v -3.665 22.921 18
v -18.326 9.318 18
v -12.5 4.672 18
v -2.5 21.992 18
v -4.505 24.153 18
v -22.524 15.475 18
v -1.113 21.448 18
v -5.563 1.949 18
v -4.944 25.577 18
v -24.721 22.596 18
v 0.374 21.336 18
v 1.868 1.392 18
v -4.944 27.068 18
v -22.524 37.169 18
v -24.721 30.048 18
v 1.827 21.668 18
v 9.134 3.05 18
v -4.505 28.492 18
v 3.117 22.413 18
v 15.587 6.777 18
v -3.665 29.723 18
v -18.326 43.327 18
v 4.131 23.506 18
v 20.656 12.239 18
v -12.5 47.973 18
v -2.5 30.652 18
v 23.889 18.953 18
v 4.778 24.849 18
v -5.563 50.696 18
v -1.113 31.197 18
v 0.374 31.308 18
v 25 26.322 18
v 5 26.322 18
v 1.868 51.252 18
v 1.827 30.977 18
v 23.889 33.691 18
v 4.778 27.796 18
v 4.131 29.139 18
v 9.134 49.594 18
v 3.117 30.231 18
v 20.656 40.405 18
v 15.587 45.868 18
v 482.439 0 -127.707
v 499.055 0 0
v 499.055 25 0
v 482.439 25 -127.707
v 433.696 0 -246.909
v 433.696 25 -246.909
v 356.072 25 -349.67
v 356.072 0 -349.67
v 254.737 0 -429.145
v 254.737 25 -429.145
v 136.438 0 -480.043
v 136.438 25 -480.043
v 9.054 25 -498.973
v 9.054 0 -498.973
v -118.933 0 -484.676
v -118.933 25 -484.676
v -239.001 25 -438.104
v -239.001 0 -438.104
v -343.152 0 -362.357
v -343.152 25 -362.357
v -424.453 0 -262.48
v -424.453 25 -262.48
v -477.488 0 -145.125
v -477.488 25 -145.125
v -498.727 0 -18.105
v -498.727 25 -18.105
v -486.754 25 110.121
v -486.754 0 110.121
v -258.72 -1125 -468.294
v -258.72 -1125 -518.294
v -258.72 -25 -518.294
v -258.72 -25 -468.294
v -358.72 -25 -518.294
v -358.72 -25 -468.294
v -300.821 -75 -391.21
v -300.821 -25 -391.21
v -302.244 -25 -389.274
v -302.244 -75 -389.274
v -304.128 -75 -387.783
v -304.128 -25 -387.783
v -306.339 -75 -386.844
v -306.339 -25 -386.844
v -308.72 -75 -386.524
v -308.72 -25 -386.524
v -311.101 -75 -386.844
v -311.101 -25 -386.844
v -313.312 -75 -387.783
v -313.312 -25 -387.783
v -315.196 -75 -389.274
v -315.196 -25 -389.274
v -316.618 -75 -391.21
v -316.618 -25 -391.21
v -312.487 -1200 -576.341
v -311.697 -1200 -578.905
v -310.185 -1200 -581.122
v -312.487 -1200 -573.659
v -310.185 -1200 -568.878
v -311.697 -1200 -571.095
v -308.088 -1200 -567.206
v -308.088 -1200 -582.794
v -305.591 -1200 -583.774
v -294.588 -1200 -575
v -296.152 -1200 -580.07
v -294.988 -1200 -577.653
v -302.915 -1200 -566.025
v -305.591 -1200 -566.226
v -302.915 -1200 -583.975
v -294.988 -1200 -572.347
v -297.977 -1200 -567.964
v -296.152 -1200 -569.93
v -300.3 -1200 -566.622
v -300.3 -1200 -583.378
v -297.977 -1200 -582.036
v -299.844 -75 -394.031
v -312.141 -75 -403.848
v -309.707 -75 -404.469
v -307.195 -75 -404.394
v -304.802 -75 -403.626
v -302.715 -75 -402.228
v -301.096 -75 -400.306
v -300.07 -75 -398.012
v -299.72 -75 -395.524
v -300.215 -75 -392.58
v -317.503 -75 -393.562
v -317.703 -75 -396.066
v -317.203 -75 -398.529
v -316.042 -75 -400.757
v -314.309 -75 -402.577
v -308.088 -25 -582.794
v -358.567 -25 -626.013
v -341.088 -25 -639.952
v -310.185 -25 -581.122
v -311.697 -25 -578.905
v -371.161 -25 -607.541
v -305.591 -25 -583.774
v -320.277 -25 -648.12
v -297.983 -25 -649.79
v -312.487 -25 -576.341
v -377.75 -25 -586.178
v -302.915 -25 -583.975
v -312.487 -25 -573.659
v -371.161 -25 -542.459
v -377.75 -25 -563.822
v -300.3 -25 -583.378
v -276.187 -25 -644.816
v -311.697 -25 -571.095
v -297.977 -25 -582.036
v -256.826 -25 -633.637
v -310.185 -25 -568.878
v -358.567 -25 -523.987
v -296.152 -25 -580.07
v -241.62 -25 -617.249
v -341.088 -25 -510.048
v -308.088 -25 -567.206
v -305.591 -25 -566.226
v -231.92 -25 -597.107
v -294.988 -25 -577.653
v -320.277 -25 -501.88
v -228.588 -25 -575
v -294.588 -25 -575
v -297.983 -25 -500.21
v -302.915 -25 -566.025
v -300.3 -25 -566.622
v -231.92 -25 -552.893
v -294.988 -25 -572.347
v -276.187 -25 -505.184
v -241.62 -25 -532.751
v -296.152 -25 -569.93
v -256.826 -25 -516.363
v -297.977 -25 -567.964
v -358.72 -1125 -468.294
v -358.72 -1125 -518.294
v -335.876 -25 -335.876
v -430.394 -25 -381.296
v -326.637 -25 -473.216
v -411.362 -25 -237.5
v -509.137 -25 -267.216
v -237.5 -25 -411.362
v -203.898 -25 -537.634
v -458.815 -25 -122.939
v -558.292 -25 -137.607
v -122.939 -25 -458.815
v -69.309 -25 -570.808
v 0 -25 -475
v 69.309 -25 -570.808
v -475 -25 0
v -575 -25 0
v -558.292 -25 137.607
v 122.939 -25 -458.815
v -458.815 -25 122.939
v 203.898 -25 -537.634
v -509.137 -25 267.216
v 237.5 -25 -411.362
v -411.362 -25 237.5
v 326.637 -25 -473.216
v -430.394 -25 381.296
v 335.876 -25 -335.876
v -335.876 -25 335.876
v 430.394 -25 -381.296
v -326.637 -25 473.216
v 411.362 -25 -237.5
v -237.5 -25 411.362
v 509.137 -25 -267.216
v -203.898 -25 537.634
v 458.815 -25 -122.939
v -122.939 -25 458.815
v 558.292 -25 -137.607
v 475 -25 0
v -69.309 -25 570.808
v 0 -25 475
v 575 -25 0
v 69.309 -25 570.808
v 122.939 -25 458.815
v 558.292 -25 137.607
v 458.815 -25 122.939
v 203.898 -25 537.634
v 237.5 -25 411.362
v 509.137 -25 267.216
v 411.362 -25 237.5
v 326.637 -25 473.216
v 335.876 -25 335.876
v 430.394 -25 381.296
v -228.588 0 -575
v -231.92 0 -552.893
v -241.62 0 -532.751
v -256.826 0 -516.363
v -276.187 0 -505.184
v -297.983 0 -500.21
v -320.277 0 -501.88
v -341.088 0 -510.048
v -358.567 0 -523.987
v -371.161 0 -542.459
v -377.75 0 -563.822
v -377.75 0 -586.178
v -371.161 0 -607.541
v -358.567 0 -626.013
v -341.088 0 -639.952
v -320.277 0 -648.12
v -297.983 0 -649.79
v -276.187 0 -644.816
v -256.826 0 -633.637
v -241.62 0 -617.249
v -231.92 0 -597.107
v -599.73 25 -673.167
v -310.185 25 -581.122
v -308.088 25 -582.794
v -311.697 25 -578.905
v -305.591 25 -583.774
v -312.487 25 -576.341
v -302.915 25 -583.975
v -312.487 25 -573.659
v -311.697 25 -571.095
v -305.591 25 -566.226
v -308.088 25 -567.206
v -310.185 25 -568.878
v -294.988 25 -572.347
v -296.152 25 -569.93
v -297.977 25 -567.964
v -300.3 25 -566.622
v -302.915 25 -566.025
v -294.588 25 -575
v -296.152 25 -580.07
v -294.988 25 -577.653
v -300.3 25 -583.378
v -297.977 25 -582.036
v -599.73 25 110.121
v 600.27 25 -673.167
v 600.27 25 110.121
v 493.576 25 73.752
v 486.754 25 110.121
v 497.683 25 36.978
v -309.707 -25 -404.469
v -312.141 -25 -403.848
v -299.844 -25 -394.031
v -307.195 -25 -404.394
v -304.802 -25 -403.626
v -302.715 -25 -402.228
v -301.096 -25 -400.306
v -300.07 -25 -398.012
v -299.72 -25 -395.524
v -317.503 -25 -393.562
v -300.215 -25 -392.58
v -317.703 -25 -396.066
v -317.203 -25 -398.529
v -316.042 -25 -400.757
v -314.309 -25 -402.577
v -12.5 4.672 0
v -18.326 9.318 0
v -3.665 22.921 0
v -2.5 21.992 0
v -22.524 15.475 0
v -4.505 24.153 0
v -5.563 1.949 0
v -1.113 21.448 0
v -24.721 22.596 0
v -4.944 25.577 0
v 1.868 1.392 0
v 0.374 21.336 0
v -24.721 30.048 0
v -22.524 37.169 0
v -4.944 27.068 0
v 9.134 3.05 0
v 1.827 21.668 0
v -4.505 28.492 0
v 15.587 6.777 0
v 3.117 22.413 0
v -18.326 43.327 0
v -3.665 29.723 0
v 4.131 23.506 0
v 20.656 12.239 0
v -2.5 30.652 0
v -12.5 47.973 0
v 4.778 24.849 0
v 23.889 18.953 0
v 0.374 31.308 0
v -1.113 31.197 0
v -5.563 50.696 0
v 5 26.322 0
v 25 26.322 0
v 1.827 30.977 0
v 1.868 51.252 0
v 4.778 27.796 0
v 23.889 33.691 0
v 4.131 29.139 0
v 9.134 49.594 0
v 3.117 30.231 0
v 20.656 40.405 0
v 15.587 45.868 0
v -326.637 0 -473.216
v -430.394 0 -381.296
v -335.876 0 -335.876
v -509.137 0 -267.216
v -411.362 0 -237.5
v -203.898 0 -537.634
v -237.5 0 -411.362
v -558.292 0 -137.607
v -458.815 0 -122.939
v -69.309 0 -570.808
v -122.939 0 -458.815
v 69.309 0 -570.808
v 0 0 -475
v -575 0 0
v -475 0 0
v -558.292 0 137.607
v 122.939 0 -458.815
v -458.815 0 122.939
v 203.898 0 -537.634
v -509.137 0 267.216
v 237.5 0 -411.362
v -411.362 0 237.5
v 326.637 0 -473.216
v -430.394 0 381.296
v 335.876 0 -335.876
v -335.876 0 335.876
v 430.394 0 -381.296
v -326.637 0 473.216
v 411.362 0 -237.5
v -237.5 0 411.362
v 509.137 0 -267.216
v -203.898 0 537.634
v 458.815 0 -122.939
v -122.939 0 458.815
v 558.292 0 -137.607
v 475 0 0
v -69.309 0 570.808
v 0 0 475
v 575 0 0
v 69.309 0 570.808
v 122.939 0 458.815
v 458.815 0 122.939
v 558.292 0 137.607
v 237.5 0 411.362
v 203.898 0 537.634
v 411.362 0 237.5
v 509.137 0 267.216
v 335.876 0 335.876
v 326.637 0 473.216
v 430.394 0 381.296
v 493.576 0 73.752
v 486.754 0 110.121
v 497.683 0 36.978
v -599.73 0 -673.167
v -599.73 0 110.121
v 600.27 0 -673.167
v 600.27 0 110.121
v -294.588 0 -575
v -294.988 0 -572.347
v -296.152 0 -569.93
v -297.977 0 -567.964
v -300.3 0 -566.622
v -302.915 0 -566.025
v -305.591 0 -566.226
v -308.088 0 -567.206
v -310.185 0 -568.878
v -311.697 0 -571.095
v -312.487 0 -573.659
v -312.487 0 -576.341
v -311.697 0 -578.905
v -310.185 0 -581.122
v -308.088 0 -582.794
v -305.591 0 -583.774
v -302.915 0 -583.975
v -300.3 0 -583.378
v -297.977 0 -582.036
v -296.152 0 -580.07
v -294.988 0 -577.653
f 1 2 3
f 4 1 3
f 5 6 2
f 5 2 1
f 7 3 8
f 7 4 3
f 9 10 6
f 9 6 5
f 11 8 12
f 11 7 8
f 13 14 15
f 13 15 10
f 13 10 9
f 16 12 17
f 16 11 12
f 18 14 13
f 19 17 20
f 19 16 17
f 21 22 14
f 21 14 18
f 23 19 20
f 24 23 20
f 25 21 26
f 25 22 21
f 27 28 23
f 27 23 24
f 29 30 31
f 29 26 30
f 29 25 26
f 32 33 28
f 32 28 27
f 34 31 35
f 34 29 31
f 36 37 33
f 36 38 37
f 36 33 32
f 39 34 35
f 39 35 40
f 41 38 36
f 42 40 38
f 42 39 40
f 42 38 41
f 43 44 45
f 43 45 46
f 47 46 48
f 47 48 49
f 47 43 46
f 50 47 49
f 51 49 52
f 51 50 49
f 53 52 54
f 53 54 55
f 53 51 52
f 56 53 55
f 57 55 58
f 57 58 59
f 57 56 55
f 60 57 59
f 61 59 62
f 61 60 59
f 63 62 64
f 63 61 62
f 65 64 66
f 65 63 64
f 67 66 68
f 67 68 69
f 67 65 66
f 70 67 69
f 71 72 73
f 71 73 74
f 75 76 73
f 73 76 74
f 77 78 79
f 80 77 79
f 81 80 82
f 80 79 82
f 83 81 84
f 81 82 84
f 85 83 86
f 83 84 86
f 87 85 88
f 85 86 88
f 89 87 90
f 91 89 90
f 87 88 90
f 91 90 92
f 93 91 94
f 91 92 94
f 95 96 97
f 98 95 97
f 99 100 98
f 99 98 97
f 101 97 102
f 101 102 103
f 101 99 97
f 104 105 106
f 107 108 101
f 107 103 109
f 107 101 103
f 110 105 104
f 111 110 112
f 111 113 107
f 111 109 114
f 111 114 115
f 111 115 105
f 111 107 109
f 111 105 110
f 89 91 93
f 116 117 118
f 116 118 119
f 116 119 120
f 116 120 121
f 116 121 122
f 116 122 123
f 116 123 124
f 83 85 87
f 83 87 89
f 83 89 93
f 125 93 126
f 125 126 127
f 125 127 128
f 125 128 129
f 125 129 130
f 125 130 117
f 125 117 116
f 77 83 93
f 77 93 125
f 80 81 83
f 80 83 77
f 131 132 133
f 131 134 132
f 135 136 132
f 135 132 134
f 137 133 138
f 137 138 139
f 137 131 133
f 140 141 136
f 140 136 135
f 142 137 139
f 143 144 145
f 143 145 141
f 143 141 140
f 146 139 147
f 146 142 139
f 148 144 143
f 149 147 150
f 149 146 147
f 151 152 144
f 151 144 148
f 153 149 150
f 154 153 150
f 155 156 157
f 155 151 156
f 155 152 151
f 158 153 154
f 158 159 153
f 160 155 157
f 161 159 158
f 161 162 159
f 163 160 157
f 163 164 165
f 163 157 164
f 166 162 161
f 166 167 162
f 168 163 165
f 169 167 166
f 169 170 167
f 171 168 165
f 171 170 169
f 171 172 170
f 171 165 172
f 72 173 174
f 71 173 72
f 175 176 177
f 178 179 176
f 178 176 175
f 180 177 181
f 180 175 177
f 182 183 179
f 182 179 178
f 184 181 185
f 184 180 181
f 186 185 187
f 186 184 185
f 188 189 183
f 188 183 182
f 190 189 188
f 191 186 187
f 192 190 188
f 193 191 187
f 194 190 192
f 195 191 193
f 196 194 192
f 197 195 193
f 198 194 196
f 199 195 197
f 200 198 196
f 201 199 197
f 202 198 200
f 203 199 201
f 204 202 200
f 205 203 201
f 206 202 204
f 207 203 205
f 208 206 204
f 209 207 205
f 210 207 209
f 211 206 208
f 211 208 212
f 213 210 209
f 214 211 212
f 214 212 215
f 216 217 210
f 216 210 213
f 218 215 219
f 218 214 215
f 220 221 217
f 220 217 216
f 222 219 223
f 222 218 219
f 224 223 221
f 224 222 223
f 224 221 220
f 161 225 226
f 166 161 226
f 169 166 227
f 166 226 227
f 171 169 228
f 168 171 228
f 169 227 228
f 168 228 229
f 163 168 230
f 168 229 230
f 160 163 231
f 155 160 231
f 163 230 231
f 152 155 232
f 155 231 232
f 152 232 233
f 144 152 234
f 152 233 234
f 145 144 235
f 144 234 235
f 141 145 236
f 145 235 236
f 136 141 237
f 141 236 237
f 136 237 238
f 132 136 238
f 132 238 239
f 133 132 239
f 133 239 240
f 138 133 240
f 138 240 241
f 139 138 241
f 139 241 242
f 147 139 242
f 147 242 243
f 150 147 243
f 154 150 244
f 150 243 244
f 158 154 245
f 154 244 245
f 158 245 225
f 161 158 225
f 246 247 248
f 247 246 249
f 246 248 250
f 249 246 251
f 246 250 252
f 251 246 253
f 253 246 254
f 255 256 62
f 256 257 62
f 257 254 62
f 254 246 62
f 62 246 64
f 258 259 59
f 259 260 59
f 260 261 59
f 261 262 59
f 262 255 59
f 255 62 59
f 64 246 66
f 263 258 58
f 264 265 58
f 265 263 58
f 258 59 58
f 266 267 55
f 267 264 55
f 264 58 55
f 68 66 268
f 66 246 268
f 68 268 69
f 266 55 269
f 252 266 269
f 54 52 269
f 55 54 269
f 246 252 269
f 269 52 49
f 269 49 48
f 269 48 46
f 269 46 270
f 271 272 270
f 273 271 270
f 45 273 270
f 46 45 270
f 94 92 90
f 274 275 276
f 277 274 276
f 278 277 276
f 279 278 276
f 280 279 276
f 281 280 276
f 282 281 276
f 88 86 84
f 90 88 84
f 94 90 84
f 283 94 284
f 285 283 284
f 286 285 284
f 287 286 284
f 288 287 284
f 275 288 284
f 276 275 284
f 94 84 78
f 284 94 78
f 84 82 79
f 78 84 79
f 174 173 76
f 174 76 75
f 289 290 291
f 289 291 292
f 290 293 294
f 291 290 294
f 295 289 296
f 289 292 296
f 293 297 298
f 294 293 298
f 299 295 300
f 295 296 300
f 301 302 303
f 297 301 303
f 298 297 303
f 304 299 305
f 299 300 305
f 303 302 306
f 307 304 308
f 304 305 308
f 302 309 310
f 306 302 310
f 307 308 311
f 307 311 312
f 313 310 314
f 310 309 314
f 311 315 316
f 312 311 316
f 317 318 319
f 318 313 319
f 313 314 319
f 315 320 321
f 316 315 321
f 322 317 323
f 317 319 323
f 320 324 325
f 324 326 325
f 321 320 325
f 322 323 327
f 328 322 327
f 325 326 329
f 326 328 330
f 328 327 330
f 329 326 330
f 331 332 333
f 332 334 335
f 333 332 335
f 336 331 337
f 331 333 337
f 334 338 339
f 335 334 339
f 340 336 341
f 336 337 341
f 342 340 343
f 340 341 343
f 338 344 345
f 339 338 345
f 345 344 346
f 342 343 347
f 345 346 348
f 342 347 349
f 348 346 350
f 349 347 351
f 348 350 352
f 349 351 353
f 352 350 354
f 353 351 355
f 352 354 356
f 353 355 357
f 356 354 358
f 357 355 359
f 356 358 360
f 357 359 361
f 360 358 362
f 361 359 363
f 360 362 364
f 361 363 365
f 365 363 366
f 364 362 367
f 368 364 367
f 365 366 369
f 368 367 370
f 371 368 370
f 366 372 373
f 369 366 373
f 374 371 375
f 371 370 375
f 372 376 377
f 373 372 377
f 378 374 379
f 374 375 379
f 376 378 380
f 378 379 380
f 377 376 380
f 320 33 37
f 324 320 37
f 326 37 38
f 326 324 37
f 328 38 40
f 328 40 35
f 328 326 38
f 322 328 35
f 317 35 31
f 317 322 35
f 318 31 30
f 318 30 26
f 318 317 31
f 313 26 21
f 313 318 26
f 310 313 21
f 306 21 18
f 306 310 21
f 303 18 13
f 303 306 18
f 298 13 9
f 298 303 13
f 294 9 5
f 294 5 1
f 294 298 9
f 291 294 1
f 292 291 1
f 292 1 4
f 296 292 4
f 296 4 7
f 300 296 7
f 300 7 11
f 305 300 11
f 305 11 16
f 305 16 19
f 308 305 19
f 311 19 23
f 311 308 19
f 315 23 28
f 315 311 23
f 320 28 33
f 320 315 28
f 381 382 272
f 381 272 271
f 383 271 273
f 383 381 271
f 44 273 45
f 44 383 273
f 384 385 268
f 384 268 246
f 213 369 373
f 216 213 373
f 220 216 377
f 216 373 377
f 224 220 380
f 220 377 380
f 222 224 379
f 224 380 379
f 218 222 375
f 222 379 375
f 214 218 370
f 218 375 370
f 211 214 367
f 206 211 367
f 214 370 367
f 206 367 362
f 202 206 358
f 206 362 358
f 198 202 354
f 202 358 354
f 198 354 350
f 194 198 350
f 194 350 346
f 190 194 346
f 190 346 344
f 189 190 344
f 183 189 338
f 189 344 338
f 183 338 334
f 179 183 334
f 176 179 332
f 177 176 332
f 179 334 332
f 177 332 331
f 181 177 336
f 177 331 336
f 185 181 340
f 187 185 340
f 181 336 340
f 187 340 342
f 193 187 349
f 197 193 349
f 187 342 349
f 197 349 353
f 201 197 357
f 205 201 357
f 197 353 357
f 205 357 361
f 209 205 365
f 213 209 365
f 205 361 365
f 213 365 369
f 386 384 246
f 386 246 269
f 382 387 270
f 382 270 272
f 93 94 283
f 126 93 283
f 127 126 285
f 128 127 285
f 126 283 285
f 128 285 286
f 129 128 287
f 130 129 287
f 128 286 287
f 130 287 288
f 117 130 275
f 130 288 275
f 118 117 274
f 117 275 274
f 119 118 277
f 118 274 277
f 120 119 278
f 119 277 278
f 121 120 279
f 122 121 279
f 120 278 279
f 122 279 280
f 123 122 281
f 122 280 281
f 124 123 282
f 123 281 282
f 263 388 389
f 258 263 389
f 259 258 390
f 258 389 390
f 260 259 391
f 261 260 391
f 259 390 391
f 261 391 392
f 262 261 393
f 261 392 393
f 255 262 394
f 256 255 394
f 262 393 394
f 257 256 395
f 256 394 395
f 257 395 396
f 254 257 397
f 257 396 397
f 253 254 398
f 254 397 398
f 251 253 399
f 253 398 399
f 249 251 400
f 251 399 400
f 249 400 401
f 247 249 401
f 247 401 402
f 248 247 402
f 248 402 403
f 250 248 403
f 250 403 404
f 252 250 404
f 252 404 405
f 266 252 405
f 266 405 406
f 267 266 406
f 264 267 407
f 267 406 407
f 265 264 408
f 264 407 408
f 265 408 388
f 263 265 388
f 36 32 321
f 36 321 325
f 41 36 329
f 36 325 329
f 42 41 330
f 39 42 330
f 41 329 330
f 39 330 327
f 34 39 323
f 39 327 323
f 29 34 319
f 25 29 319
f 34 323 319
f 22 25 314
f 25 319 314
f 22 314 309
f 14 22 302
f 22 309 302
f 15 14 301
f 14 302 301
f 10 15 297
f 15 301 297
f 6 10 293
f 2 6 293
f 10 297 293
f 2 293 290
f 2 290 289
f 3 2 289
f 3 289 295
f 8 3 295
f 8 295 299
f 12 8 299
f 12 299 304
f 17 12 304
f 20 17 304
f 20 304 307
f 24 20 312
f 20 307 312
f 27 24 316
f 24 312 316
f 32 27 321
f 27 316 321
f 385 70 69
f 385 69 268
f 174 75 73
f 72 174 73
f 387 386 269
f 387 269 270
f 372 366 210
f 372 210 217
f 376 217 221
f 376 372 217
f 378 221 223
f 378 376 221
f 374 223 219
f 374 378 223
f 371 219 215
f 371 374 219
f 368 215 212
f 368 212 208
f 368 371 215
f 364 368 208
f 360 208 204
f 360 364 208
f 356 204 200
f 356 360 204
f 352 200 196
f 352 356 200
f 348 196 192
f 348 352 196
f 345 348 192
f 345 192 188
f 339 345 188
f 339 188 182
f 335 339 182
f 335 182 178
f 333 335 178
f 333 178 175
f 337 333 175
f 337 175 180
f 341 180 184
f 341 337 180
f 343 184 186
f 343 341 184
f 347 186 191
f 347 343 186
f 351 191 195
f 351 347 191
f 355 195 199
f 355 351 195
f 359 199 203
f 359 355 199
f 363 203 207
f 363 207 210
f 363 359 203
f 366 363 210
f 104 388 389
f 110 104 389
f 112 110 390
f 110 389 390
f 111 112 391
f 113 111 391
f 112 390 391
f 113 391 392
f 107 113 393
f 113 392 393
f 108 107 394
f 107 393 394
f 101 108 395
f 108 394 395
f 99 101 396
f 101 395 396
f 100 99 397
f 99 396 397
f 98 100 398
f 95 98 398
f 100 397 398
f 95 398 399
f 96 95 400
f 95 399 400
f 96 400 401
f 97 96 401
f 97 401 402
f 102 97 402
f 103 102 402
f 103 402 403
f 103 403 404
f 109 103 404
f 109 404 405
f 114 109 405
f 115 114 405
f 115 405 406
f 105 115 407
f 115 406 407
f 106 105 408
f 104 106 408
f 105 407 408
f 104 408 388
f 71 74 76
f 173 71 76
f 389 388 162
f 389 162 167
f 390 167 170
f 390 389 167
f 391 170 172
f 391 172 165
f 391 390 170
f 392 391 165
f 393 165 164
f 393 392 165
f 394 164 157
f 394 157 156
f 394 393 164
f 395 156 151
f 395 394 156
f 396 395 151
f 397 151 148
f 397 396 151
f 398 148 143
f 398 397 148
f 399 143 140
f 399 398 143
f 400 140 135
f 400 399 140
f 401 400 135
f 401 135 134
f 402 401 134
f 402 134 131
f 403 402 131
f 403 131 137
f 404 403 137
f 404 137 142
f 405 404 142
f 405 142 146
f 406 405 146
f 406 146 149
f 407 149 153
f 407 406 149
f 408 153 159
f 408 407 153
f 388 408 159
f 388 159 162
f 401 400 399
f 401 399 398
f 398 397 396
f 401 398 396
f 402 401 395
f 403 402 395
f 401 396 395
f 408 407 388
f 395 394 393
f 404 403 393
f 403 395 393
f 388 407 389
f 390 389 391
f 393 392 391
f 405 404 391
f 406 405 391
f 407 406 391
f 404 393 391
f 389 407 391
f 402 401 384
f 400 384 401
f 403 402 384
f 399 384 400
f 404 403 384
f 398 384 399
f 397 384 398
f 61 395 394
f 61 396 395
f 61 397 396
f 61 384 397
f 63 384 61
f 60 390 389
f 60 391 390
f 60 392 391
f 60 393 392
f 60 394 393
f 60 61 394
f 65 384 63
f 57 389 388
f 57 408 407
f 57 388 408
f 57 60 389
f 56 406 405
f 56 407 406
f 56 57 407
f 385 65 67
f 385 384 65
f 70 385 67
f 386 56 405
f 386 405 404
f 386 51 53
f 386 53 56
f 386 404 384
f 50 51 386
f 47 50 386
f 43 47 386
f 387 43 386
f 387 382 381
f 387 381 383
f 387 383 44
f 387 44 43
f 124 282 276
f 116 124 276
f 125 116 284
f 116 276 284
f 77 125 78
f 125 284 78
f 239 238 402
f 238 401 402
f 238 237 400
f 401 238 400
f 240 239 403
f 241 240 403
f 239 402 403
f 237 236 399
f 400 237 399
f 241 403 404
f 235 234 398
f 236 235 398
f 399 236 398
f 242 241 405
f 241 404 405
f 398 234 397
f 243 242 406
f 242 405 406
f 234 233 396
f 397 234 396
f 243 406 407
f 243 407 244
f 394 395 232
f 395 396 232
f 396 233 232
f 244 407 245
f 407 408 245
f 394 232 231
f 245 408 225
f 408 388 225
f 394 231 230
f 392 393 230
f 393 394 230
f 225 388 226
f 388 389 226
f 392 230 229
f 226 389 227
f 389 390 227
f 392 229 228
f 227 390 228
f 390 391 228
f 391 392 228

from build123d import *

# Parameters (mm, degrees)
F0_R     = 575
F0_R_2   = 475
F1_DEPTH = 25
F0_R_3   = 75
F0_R_4   = 9
F2_DEPTH = 1200
F3_R     = 25
F3_R_2   = 5
F4_DEPTH = 18
F5_R     = 75
F5_R_2   = 9
F6_DEPTH = 25
F8_DEPTH = 50
F9_DEPTH = 1100


with BuildPart() as f1:
    # F0 (on Front) → F1 (new body)
    with BuildSketch(Plane.XZ):
        Circle(F0_R)
        Circle(F0_R_2, mode=Mode.SUBTRACT)
    extrude(amount=F1_DEPTH)


with BuildPart() as f1b:
    # F0 (on Front) → F1, piece 2 (new body)
    with BuildSketch(Plane.XZ):
        with Locations((-303.5879433155, -575)):
            Circle(F0_R_3)
        with Locations((-303.5879433155, -575)):
            Circle(F0_R_4, mode=Mode.SUBTRACT)
    extrude(amount=F1_DEPTH)


with BuildPart() as f2:
    # F0 (on Front) → F2 (new body)
    with BuildSketch(Plane.XZ):
        with Locations((-303.5879433155, -575)):
            Circle(F0_R_4)
    extrude(amount=F2_DEPTH)


with BuildPart() as f4:
    # F3 (on Top) → F4 (new body)
    with BuildSketch(Plane.XY):
        with Locations((0, 26.3223070651)):
            Circle(F3_R)
        with Locations((0, 26.3223070651)):
            Circle(F3_R_2, mode=Mode.SUBTRACT)
    extrude(amount=F4_DEPTH)


with BuildPart() as f6:
    # F5 (on Front) → F6 (new body)
    with BuildSketch(Plane.XZ):
        with BuildLine():
            ThreePointArc((564.3566034894, 110.1209521294), (572.3329655919, 55.3170543033), (575, 0))
            ThreePointArc((575, 0), (-55.3170543033, -572.3329655919), (-564.3566034894, 110.1209521294))
            Line((-564.3566034894, 110.1209521294), (-599.7295975685, 110.1209521294))
            Line((-599.7295975685, 110.1209521294), (-599.7295975685, -673.1666922569))
            Line((-599.7295975685, -673.1666922569), (600.2704024315, -673.1666922569))
            Line((600.2704024315, -673.1666922569), (600.2704024315, 110.1209521294))
            Line((600.2704024315, 110.1209521294), (564.3566034894, 110.1209521294))
        make_face()
        with Locations((-303.5879433155, -575)):
            Circle(F5_R, mode=Mode.SUBTRACT)
        with BuildLine():
            ThreePointArc((-564.3566034894, 110.1209521294), (-55.3170543033, -572.3329655919), (575, 0))
            ThreePointArc((575, 0), (572.3329655919, 55.3170543033), (564.3566034894, 110.1209521294))
            Line((564.3566034894, 110.1209521294), (486.7541368029, 110.1209521294))
            ThreePointArc((486.7541368029, 110.1209521294), (495.9704910403, 55.4029404449), (499.0553213749, 0))
            ThreePointArc((499.0553213749, 0), (-55.4029404449, -495.9704910403), (-486.7541368029, 110.1209521294))
            Line((-486.7541368029, 110.1209521294), (-564.3566034894, 110.1209521294))
        make_face()
        with Locations((-303.5879433155, -575)):
            Circle(F5_R)
        with Locations((-303.5879433155, -575)):
            Circle(F5_R_2, mode=Mode.SUBTRACT)
    extrude(amount=-F6_DEPTH)


with BuildPart() as f8:
    # F7 (on face) → F8 (new body)
    with BuildSketch(Plane.XZ.offset(25)):
        with BuildLine():
            ThreePointArc((-316.6183916588, -391.2097421513), (-310.9458954187, -404.2440885601), (-299.7197065353, -395.5237627029))
            ThreePointArc((-299.7197065353, -395.5237627029), (-299.9993806781, -393.2975738196), (-300.8210214118, -391.2097421513))
            ThreePointArc((-300.8210214118, -391.2097421513), (-308.7197065353, -386.5237627029), (-316.6183916588, -391.2097421513))
        make_face()
    extrude(amount=F8_DEPTH)


with BuildPart() as f9:
    # F7 (on face) → F9 (new body)
    with BuildSketch(Plane.XZ.offset(25)):
        with BuildLine():
            Line((-258.7197065353, -513.5066829655), (-258.7197065353, -468.2944536209))
            Line((-258.7197065353, -468.2944536209), (-333.6544690363, -468.2944536209))
            ThreePointArc((-333.6544690363, -468.2944536209), (-297.0485269979, -492.3283179022), (-258.7197065354, -513.5066829655))
        make_face()
        with BuildLine():
            ThreePointArc((-258.7197065354, -513.5066829655), (-297.0485269979, -492.3283179022), (-333.6544690363, -468.2944536209))
            Line((-333.6544690363, -468.2944536209), (-358.7197065353, -468.2944536209))
            Line((-358.7197065353, -468.2944536209), (-358.7197065353, -518.2944536209))
            Line((-358.7197065353, -518.2944536209), (-258.7197065353, -518.2944536209))
            Line((-258.7197065353, -518.2944536209), (-258.7197065353, -513.5066829655))
        make_face()
    extrude(amount=F9_DEPTH)


solid = Compound([f1.part, f1b.part, f2.part, f4.part, f6.part, f8.part, f9.part])
